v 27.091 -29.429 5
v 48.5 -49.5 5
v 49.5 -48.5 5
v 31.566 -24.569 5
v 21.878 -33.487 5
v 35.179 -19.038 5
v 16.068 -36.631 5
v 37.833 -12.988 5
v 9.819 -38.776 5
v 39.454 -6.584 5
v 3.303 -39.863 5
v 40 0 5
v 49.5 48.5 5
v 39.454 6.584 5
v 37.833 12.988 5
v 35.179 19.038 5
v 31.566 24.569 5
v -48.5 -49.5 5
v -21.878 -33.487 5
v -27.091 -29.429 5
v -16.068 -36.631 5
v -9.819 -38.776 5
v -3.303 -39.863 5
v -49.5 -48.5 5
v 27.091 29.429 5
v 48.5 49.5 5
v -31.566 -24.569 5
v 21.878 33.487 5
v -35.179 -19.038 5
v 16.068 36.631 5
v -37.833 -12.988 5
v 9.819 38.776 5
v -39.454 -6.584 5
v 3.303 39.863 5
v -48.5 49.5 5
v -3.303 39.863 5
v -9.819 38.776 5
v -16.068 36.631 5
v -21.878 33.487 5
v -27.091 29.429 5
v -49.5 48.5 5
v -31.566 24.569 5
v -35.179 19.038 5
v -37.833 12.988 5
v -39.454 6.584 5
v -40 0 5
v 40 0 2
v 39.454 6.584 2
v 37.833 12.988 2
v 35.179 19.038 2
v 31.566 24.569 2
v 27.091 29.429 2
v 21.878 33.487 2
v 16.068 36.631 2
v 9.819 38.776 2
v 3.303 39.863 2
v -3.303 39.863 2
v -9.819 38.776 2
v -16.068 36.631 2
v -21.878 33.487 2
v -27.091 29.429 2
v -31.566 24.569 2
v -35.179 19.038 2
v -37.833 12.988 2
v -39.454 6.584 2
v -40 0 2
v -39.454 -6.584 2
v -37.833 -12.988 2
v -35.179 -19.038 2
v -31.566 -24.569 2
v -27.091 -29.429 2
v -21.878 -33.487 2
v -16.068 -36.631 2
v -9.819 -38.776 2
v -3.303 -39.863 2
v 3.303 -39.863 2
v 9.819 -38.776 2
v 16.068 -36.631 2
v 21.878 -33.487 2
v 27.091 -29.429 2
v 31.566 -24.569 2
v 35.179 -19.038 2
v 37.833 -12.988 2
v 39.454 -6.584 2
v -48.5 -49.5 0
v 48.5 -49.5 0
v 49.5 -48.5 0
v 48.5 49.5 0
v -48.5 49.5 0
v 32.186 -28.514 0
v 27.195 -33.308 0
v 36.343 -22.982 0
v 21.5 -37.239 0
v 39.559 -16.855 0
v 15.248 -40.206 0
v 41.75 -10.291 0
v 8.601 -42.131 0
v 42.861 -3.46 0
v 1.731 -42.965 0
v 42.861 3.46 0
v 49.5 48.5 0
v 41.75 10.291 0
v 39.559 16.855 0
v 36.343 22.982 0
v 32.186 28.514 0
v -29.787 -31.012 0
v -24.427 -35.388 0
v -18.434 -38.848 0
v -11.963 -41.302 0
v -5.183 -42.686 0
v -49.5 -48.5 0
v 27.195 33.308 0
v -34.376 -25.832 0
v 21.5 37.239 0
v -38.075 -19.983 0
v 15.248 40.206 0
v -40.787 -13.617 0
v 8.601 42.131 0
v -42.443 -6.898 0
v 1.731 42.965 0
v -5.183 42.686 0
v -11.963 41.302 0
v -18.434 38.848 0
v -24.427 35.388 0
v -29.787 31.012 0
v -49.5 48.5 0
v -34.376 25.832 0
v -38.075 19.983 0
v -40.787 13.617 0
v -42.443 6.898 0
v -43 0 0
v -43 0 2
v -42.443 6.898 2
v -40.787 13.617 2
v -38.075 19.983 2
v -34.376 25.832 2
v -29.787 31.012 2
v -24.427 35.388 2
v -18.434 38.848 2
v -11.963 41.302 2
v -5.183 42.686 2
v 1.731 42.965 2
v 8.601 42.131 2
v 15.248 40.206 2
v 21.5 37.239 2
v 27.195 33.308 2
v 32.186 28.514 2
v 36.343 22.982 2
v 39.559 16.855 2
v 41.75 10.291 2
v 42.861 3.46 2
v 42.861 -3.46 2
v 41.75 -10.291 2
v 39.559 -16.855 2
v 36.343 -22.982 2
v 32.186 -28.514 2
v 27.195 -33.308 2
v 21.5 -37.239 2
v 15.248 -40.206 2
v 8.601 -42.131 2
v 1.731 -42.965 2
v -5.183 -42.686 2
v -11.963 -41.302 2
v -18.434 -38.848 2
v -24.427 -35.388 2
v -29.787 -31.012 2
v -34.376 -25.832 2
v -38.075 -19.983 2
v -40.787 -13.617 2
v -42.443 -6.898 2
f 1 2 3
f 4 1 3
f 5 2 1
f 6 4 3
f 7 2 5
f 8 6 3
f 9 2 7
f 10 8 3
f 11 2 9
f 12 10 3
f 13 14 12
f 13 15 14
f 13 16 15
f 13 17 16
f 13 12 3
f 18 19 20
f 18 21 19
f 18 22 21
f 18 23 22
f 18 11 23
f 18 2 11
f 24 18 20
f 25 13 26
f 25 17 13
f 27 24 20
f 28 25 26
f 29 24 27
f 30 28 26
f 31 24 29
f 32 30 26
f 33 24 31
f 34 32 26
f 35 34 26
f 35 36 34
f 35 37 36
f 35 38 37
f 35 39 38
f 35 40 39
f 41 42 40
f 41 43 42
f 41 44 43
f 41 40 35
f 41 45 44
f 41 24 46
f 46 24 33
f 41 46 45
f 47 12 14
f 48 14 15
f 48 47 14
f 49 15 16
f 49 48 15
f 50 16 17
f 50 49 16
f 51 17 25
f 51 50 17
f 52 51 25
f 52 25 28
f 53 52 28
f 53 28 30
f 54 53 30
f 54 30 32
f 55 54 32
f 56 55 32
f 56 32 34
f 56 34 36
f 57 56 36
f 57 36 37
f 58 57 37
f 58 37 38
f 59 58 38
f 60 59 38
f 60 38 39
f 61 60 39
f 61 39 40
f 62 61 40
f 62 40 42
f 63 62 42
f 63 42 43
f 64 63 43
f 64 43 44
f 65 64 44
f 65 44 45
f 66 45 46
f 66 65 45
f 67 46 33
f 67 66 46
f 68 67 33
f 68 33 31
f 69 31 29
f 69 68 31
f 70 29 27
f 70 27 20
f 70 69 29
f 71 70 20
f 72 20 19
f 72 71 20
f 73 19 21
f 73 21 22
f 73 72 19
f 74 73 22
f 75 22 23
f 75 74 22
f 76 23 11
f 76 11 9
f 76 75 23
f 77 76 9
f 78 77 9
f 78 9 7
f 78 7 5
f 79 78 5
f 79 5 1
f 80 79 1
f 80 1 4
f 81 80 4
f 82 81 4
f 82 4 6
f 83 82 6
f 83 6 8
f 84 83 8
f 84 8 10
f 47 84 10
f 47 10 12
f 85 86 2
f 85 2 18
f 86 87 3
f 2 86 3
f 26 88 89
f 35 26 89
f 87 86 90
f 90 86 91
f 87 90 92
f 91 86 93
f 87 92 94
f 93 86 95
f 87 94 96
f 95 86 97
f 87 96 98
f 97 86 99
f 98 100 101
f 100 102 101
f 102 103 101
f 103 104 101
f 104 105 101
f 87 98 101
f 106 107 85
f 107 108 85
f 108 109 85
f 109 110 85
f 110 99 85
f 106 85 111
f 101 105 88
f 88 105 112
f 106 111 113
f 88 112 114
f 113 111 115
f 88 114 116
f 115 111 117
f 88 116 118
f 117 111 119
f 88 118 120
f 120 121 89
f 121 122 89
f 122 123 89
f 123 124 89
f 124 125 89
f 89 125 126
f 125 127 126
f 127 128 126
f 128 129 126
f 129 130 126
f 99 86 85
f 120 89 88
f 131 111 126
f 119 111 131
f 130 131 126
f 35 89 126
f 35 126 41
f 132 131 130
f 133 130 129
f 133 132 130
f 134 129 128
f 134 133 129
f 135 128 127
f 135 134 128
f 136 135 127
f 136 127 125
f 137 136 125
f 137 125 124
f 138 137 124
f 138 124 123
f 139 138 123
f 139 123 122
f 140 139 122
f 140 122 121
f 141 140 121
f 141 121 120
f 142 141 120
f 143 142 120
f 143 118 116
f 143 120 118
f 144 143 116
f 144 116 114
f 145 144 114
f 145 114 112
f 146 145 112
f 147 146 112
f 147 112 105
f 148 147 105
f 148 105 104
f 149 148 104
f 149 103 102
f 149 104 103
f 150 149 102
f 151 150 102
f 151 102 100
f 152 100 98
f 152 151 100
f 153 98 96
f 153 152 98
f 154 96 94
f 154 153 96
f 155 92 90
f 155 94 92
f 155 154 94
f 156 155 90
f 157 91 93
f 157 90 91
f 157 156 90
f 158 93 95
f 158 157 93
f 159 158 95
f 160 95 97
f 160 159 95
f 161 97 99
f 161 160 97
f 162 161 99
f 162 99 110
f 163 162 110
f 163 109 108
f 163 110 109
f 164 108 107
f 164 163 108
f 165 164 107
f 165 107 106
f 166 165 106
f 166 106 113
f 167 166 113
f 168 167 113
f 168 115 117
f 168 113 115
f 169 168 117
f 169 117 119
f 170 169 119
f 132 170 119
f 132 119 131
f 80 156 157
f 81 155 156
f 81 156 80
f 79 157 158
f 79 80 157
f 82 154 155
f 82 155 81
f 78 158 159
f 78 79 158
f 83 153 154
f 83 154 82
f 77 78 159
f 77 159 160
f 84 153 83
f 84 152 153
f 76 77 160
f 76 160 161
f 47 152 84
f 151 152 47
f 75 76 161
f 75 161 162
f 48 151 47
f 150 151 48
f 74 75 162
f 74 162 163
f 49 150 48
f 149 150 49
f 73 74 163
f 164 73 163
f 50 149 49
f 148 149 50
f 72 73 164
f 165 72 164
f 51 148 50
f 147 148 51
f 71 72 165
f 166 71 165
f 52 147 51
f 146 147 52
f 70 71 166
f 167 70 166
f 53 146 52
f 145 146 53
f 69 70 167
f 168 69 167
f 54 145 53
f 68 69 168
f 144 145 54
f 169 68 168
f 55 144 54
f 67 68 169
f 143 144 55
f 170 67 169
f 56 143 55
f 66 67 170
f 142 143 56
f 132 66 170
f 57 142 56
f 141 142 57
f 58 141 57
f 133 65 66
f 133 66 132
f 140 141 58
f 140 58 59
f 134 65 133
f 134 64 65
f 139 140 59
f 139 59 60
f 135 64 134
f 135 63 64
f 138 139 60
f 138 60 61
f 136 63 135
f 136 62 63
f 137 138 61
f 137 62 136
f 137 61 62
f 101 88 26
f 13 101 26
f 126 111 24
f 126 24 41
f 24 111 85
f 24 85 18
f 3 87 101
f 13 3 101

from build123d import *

# Parameters (mm, degrees)
SKETCH1_W               = 99
SKETCH1_H               = 99
SKETCH1_R               = 40
BOSS_EXTRUDE1_DEPTH     = 5
CUT_EXTRUDE1_DEPTH      = 71.1819065
CUT_EXTRUDE1_DEPTH_BACK = 2
SKETCH2_R               = 43
CHAMFER1_SIZE           = 1


with BuildPart() as part:
    # Sketch1 → Boss-Extrude1 (new body)
    with BuildSketch(Plane(origin=(0, 0, 0), x_dir=(0, 1, 0), z_dir=(0, 0, 1))):
        Rectangle(SKETCH1_W, SKETCH1_H)
        with Locations(Location((0, 0, 0), (0, 0, 270))):
            Circle(SKETCH1_R, mode=Mode.SUBTRACT)
    extrude(amount=BOSS_EXTRUDE1_DEPTH)

    # Sketch2 → Cut-Extrude1 (cut, two sides: drawn at the far end of the back side and taken through both)
    with BuildSketch(Plane(origin=(0, 0, 0), x_dir=(1, 0, 0), z_dir=(0, 0, -1)).offset(-CUT_EXTRUDE1_DEPTH_BACK)):
        with Locations(Location((0, 0, 0), (0, 0, 180))):
            Circle(SKETCH2_R)
    extrude(amount=CUT_EXTRUDE1_DEPTH + CUT_EXTRUDE1_DEPTH_BACK, mode=Mode.SUBTRACT)

    # Chamfer1
    chamfer1_edges = [part.edges().sort_by_distance(p)[0] for p in [
        (-49.5, -49.5, 2.5),
        (-49.5, 49.5, 2.5),
        (49.5, 49.5, 2.5),
        (49.5, -49.5, 2.5),
    ]]
    chamfer(chamfer1_edges, length=CHAMFER1_SIZE)


solid = part.part
